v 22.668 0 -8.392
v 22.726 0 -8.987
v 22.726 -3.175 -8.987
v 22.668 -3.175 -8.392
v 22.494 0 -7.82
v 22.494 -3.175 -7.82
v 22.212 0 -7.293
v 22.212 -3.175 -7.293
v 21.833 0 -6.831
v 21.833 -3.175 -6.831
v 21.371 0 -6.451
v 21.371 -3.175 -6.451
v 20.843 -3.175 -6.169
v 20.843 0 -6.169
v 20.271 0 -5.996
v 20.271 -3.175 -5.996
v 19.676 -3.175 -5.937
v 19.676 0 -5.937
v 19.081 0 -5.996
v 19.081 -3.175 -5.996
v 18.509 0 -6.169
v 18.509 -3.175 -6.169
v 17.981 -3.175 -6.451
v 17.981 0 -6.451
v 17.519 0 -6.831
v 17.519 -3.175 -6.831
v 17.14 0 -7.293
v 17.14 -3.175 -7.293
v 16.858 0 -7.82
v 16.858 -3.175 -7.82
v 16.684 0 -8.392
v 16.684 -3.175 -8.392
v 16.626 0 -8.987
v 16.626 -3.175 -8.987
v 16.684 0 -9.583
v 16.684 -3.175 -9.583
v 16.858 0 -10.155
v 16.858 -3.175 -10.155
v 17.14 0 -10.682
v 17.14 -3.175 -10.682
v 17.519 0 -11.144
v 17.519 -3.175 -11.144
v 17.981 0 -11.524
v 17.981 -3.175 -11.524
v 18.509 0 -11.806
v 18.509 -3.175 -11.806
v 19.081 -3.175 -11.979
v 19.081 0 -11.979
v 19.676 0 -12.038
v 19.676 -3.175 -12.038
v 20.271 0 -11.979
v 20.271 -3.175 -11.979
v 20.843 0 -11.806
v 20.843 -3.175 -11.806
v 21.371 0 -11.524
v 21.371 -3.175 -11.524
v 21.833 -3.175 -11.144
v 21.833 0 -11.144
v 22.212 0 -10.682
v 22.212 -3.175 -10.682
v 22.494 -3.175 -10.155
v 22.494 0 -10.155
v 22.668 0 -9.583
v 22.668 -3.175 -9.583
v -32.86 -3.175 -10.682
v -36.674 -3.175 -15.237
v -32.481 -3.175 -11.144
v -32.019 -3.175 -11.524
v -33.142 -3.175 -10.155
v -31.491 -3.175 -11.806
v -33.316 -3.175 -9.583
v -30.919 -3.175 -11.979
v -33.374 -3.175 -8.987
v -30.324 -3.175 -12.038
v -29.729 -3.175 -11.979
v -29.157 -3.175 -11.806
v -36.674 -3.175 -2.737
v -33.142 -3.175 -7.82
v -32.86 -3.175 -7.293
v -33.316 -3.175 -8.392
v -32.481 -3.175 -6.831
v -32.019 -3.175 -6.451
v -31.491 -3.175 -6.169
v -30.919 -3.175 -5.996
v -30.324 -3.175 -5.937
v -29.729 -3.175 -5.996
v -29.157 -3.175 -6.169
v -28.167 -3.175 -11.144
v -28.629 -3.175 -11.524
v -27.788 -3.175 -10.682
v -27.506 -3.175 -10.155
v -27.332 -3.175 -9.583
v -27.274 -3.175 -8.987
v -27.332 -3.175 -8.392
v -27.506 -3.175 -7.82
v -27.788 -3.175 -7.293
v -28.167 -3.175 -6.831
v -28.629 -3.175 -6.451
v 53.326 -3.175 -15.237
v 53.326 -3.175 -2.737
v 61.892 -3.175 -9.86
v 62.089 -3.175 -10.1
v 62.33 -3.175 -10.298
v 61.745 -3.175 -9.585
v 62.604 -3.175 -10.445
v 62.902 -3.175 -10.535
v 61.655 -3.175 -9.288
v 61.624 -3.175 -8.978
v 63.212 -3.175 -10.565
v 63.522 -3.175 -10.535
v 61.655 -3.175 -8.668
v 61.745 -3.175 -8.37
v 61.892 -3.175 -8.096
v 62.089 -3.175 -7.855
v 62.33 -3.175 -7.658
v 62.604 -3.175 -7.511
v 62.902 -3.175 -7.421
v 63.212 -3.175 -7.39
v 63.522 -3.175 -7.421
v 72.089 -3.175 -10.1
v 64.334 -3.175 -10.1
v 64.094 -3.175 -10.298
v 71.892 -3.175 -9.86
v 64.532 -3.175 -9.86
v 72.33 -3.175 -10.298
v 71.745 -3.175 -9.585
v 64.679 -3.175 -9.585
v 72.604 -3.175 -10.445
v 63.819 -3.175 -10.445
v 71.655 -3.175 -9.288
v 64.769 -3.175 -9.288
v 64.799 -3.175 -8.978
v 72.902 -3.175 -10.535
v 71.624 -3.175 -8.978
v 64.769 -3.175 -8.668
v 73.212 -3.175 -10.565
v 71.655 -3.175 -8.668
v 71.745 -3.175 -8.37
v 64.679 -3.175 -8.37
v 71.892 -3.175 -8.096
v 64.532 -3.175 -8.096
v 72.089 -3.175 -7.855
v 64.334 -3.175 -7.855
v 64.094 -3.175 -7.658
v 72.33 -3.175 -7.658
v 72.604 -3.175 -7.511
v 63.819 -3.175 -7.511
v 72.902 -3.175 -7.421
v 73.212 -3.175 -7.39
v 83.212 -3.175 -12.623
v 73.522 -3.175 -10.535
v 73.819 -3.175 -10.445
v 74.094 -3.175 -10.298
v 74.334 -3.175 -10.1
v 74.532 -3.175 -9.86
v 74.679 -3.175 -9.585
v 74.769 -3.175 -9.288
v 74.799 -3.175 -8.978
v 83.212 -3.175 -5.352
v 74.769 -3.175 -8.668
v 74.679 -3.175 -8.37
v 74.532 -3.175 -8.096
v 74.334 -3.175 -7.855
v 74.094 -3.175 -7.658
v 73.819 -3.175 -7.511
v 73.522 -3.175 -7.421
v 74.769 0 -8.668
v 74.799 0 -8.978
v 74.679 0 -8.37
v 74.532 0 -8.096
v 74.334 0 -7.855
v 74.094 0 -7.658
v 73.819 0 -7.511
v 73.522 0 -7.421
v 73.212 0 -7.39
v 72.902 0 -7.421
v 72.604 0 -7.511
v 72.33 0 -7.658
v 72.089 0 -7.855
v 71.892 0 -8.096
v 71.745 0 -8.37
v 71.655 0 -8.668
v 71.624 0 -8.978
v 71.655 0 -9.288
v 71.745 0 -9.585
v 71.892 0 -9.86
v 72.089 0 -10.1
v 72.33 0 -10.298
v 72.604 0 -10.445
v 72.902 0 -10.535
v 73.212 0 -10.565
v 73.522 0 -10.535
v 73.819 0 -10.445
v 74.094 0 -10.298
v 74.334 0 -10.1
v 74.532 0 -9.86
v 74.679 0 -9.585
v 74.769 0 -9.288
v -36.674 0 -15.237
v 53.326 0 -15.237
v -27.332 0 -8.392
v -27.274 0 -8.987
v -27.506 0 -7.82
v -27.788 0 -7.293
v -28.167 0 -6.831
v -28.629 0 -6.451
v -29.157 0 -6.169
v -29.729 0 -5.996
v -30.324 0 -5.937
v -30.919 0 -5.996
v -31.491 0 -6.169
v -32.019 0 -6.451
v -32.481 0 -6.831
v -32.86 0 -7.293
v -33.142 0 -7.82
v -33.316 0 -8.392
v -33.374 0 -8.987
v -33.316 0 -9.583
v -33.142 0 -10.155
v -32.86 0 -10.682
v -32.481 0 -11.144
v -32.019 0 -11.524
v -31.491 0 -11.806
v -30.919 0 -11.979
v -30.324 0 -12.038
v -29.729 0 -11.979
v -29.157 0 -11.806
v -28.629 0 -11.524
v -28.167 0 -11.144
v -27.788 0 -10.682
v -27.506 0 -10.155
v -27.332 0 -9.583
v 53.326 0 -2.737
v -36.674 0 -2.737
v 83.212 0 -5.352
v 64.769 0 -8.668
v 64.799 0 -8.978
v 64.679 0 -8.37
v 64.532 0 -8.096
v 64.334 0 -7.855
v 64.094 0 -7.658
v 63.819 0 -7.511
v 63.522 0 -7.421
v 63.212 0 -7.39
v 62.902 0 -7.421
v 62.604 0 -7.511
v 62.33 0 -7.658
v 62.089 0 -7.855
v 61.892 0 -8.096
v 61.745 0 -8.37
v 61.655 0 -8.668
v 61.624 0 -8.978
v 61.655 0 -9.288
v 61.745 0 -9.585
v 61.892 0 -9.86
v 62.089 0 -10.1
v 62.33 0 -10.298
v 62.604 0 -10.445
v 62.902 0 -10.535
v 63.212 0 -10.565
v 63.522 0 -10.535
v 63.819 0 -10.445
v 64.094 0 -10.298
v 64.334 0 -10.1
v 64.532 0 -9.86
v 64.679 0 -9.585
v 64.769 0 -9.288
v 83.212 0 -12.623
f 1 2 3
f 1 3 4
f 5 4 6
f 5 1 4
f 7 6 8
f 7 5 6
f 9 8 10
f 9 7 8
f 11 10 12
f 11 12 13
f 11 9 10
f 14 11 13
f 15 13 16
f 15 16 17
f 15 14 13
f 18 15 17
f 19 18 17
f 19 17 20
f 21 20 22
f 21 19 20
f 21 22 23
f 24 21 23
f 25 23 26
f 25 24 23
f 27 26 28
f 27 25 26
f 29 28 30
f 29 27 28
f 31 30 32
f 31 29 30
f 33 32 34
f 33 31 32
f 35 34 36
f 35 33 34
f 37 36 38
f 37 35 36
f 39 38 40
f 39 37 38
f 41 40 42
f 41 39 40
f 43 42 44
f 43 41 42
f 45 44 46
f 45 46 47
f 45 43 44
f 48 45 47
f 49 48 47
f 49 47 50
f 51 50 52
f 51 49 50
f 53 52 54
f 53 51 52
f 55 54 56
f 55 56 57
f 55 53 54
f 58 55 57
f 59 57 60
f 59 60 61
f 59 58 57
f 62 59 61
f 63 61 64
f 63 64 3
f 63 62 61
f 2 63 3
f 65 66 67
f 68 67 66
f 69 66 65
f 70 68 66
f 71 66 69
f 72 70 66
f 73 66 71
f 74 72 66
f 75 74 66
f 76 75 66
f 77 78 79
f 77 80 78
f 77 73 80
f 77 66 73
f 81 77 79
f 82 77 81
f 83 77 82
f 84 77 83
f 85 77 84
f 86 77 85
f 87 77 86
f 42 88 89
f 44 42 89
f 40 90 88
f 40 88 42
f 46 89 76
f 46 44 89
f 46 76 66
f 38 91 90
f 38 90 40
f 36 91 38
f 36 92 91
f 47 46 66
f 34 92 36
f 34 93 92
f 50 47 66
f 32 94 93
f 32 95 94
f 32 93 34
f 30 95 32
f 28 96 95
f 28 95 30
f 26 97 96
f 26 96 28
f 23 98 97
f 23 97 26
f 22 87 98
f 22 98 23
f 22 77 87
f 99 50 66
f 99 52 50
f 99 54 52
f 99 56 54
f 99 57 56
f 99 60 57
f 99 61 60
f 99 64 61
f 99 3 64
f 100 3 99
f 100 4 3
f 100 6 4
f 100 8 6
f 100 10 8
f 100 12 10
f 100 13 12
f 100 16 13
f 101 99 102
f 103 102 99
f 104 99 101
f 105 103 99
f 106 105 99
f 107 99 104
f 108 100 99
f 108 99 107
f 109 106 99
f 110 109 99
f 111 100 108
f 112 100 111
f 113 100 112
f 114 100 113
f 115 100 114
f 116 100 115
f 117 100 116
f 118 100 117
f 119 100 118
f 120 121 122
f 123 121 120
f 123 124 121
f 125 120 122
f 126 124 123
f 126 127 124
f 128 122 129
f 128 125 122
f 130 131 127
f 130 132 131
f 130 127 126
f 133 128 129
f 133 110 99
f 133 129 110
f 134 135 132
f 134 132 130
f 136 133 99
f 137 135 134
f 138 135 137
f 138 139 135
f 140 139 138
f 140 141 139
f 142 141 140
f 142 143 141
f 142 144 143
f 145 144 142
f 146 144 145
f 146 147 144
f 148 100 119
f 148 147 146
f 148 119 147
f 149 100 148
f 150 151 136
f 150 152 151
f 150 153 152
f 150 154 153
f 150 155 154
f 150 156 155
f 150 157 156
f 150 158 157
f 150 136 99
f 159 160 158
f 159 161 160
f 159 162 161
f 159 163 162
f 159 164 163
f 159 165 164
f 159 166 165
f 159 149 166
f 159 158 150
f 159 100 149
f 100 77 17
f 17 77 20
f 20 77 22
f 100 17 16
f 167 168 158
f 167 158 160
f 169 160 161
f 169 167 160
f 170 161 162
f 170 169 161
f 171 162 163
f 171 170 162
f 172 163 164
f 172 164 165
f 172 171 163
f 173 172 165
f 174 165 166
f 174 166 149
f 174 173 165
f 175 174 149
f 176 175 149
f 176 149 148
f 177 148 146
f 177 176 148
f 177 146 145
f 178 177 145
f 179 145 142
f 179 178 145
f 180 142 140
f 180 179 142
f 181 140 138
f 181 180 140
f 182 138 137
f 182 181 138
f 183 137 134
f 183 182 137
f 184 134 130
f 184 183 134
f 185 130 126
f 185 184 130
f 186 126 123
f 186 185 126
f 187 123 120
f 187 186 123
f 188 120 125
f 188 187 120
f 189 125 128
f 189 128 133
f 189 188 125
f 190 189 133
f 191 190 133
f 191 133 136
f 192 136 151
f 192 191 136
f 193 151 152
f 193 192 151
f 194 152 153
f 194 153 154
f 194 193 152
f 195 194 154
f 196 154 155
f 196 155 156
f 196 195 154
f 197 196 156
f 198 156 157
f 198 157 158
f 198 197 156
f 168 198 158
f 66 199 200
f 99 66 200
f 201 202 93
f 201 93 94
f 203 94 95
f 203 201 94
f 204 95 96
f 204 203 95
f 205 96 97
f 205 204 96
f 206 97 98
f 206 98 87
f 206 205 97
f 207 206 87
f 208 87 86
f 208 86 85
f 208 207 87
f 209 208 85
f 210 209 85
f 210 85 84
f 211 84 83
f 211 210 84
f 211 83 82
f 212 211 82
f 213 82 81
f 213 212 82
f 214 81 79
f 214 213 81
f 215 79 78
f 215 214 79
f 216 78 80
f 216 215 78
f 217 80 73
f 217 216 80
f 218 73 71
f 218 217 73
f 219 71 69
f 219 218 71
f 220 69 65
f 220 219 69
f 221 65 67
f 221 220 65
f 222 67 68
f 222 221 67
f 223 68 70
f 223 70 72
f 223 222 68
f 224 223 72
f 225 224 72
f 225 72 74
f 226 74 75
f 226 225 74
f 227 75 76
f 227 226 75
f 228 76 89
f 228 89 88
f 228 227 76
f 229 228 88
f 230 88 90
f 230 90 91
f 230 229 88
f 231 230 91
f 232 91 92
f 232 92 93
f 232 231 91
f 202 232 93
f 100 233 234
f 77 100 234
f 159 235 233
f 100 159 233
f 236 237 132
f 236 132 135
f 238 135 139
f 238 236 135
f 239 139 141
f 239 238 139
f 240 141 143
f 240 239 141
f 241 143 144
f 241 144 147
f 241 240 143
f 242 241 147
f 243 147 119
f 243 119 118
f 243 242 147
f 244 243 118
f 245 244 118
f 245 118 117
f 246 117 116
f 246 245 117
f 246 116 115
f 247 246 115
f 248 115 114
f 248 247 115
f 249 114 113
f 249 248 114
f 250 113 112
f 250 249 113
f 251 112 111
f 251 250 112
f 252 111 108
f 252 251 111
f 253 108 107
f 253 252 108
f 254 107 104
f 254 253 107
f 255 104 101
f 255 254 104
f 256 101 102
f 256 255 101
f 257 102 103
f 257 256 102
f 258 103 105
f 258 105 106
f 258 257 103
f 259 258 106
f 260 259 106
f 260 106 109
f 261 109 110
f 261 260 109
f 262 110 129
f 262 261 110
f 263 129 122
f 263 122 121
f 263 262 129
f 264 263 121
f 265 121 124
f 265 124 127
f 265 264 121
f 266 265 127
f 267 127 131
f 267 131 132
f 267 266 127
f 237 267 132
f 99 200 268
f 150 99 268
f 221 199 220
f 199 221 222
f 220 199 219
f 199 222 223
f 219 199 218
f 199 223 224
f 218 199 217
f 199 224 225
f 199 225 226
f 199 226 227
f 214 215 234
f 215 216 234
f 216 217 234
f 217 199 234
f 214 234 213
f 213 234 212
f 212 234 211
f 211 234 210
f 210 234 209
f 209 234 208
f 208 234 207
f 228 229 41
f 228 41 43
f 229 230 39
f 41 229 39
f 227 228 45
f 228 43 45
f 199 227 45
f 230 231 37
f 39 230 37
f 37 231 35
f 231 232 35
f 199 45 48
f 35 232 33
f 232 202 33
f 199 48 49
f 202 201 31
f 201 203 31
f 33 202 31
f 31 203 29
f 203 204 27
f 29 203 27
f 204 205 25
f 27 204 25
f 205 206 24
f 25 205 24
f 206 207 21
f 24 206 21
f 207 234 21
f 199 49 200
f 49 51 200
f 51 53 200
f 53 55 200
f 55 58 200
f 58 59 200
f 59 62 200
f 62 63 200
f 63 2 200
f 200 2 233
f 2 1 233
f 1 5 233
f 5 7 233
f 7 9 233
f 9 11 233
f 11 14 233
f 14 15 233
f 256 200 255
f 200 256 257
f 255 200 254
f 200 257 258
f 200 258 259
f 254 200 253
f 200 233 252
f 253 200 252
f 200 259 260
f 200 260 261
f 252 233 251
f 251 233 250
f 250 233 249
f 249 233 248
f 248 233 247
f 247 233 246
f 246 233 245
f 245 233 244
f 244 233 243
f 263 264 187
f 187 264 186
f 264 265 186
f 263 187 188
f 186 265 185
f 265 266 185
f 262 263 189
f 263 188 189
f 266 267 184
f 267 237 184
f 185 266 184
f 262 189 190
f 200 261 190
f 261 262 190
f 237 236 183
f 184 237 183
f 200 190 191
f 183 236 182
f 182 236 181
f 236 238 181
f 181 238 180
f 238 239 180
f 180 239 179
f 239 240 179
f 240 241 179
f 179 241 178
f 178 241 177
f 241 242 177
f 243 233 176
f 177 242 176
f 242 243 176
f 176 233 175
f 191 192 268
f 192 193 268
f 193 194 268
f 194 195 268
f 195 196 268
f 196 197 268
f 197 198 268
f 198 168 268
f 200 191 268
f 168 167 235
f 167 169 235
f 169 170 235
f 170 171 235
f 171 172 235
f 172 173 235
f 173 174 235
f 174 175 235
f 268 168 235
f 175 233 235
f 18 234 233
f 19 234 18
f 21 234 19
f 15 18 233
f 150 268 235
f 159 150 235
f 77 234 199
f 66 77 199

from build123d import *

# Parameters (mm, degrees)
F0_R     = 3.0502649117
F0_R_2   = 1.5875
F1_DEPTH = 3.175


# Not quite as in the source:
# - a length typed as a fraction of an inch, garbled in the dataset ("3 / 203.2 mm" for 3/8 in), is restored


with BuildPart() as f1:
    # F0 (on Front) → F1 (new body)
    with BuildSketch(Plane.XZ):
        Polygon((53.3261225373, -2.7374546753), (-36.6738774627, -2.7374546753), (-36.6738774627, -15.2374546753), (53.3261225373, -15.2374546753), (83.21196348, -12.6227823928), (83.21196348, -8.9778823928), (83.21196348, -5.3521269577), align=None)
        with Locations((-30.3238774627, -8.9874546753)):
            Circle(F0_R, mode=Mode.SUBTRACT)
        with Locations((19.6761225373, -8.9874546753)):
            Circle(F0_R, mode=Mode.SUBTRACT)
        with Locations((63.21196348, -8.9778823928)):
            Circle(F0_R_2, mode=Mode.SUBTRACT)
        with Locations((73.21196348, -8.9778823928)):
            Circle(F0_R_2, mode=Mode.SUBTRACT)
    extrude(amount=F1_DEPTH)


solid = f1.part
